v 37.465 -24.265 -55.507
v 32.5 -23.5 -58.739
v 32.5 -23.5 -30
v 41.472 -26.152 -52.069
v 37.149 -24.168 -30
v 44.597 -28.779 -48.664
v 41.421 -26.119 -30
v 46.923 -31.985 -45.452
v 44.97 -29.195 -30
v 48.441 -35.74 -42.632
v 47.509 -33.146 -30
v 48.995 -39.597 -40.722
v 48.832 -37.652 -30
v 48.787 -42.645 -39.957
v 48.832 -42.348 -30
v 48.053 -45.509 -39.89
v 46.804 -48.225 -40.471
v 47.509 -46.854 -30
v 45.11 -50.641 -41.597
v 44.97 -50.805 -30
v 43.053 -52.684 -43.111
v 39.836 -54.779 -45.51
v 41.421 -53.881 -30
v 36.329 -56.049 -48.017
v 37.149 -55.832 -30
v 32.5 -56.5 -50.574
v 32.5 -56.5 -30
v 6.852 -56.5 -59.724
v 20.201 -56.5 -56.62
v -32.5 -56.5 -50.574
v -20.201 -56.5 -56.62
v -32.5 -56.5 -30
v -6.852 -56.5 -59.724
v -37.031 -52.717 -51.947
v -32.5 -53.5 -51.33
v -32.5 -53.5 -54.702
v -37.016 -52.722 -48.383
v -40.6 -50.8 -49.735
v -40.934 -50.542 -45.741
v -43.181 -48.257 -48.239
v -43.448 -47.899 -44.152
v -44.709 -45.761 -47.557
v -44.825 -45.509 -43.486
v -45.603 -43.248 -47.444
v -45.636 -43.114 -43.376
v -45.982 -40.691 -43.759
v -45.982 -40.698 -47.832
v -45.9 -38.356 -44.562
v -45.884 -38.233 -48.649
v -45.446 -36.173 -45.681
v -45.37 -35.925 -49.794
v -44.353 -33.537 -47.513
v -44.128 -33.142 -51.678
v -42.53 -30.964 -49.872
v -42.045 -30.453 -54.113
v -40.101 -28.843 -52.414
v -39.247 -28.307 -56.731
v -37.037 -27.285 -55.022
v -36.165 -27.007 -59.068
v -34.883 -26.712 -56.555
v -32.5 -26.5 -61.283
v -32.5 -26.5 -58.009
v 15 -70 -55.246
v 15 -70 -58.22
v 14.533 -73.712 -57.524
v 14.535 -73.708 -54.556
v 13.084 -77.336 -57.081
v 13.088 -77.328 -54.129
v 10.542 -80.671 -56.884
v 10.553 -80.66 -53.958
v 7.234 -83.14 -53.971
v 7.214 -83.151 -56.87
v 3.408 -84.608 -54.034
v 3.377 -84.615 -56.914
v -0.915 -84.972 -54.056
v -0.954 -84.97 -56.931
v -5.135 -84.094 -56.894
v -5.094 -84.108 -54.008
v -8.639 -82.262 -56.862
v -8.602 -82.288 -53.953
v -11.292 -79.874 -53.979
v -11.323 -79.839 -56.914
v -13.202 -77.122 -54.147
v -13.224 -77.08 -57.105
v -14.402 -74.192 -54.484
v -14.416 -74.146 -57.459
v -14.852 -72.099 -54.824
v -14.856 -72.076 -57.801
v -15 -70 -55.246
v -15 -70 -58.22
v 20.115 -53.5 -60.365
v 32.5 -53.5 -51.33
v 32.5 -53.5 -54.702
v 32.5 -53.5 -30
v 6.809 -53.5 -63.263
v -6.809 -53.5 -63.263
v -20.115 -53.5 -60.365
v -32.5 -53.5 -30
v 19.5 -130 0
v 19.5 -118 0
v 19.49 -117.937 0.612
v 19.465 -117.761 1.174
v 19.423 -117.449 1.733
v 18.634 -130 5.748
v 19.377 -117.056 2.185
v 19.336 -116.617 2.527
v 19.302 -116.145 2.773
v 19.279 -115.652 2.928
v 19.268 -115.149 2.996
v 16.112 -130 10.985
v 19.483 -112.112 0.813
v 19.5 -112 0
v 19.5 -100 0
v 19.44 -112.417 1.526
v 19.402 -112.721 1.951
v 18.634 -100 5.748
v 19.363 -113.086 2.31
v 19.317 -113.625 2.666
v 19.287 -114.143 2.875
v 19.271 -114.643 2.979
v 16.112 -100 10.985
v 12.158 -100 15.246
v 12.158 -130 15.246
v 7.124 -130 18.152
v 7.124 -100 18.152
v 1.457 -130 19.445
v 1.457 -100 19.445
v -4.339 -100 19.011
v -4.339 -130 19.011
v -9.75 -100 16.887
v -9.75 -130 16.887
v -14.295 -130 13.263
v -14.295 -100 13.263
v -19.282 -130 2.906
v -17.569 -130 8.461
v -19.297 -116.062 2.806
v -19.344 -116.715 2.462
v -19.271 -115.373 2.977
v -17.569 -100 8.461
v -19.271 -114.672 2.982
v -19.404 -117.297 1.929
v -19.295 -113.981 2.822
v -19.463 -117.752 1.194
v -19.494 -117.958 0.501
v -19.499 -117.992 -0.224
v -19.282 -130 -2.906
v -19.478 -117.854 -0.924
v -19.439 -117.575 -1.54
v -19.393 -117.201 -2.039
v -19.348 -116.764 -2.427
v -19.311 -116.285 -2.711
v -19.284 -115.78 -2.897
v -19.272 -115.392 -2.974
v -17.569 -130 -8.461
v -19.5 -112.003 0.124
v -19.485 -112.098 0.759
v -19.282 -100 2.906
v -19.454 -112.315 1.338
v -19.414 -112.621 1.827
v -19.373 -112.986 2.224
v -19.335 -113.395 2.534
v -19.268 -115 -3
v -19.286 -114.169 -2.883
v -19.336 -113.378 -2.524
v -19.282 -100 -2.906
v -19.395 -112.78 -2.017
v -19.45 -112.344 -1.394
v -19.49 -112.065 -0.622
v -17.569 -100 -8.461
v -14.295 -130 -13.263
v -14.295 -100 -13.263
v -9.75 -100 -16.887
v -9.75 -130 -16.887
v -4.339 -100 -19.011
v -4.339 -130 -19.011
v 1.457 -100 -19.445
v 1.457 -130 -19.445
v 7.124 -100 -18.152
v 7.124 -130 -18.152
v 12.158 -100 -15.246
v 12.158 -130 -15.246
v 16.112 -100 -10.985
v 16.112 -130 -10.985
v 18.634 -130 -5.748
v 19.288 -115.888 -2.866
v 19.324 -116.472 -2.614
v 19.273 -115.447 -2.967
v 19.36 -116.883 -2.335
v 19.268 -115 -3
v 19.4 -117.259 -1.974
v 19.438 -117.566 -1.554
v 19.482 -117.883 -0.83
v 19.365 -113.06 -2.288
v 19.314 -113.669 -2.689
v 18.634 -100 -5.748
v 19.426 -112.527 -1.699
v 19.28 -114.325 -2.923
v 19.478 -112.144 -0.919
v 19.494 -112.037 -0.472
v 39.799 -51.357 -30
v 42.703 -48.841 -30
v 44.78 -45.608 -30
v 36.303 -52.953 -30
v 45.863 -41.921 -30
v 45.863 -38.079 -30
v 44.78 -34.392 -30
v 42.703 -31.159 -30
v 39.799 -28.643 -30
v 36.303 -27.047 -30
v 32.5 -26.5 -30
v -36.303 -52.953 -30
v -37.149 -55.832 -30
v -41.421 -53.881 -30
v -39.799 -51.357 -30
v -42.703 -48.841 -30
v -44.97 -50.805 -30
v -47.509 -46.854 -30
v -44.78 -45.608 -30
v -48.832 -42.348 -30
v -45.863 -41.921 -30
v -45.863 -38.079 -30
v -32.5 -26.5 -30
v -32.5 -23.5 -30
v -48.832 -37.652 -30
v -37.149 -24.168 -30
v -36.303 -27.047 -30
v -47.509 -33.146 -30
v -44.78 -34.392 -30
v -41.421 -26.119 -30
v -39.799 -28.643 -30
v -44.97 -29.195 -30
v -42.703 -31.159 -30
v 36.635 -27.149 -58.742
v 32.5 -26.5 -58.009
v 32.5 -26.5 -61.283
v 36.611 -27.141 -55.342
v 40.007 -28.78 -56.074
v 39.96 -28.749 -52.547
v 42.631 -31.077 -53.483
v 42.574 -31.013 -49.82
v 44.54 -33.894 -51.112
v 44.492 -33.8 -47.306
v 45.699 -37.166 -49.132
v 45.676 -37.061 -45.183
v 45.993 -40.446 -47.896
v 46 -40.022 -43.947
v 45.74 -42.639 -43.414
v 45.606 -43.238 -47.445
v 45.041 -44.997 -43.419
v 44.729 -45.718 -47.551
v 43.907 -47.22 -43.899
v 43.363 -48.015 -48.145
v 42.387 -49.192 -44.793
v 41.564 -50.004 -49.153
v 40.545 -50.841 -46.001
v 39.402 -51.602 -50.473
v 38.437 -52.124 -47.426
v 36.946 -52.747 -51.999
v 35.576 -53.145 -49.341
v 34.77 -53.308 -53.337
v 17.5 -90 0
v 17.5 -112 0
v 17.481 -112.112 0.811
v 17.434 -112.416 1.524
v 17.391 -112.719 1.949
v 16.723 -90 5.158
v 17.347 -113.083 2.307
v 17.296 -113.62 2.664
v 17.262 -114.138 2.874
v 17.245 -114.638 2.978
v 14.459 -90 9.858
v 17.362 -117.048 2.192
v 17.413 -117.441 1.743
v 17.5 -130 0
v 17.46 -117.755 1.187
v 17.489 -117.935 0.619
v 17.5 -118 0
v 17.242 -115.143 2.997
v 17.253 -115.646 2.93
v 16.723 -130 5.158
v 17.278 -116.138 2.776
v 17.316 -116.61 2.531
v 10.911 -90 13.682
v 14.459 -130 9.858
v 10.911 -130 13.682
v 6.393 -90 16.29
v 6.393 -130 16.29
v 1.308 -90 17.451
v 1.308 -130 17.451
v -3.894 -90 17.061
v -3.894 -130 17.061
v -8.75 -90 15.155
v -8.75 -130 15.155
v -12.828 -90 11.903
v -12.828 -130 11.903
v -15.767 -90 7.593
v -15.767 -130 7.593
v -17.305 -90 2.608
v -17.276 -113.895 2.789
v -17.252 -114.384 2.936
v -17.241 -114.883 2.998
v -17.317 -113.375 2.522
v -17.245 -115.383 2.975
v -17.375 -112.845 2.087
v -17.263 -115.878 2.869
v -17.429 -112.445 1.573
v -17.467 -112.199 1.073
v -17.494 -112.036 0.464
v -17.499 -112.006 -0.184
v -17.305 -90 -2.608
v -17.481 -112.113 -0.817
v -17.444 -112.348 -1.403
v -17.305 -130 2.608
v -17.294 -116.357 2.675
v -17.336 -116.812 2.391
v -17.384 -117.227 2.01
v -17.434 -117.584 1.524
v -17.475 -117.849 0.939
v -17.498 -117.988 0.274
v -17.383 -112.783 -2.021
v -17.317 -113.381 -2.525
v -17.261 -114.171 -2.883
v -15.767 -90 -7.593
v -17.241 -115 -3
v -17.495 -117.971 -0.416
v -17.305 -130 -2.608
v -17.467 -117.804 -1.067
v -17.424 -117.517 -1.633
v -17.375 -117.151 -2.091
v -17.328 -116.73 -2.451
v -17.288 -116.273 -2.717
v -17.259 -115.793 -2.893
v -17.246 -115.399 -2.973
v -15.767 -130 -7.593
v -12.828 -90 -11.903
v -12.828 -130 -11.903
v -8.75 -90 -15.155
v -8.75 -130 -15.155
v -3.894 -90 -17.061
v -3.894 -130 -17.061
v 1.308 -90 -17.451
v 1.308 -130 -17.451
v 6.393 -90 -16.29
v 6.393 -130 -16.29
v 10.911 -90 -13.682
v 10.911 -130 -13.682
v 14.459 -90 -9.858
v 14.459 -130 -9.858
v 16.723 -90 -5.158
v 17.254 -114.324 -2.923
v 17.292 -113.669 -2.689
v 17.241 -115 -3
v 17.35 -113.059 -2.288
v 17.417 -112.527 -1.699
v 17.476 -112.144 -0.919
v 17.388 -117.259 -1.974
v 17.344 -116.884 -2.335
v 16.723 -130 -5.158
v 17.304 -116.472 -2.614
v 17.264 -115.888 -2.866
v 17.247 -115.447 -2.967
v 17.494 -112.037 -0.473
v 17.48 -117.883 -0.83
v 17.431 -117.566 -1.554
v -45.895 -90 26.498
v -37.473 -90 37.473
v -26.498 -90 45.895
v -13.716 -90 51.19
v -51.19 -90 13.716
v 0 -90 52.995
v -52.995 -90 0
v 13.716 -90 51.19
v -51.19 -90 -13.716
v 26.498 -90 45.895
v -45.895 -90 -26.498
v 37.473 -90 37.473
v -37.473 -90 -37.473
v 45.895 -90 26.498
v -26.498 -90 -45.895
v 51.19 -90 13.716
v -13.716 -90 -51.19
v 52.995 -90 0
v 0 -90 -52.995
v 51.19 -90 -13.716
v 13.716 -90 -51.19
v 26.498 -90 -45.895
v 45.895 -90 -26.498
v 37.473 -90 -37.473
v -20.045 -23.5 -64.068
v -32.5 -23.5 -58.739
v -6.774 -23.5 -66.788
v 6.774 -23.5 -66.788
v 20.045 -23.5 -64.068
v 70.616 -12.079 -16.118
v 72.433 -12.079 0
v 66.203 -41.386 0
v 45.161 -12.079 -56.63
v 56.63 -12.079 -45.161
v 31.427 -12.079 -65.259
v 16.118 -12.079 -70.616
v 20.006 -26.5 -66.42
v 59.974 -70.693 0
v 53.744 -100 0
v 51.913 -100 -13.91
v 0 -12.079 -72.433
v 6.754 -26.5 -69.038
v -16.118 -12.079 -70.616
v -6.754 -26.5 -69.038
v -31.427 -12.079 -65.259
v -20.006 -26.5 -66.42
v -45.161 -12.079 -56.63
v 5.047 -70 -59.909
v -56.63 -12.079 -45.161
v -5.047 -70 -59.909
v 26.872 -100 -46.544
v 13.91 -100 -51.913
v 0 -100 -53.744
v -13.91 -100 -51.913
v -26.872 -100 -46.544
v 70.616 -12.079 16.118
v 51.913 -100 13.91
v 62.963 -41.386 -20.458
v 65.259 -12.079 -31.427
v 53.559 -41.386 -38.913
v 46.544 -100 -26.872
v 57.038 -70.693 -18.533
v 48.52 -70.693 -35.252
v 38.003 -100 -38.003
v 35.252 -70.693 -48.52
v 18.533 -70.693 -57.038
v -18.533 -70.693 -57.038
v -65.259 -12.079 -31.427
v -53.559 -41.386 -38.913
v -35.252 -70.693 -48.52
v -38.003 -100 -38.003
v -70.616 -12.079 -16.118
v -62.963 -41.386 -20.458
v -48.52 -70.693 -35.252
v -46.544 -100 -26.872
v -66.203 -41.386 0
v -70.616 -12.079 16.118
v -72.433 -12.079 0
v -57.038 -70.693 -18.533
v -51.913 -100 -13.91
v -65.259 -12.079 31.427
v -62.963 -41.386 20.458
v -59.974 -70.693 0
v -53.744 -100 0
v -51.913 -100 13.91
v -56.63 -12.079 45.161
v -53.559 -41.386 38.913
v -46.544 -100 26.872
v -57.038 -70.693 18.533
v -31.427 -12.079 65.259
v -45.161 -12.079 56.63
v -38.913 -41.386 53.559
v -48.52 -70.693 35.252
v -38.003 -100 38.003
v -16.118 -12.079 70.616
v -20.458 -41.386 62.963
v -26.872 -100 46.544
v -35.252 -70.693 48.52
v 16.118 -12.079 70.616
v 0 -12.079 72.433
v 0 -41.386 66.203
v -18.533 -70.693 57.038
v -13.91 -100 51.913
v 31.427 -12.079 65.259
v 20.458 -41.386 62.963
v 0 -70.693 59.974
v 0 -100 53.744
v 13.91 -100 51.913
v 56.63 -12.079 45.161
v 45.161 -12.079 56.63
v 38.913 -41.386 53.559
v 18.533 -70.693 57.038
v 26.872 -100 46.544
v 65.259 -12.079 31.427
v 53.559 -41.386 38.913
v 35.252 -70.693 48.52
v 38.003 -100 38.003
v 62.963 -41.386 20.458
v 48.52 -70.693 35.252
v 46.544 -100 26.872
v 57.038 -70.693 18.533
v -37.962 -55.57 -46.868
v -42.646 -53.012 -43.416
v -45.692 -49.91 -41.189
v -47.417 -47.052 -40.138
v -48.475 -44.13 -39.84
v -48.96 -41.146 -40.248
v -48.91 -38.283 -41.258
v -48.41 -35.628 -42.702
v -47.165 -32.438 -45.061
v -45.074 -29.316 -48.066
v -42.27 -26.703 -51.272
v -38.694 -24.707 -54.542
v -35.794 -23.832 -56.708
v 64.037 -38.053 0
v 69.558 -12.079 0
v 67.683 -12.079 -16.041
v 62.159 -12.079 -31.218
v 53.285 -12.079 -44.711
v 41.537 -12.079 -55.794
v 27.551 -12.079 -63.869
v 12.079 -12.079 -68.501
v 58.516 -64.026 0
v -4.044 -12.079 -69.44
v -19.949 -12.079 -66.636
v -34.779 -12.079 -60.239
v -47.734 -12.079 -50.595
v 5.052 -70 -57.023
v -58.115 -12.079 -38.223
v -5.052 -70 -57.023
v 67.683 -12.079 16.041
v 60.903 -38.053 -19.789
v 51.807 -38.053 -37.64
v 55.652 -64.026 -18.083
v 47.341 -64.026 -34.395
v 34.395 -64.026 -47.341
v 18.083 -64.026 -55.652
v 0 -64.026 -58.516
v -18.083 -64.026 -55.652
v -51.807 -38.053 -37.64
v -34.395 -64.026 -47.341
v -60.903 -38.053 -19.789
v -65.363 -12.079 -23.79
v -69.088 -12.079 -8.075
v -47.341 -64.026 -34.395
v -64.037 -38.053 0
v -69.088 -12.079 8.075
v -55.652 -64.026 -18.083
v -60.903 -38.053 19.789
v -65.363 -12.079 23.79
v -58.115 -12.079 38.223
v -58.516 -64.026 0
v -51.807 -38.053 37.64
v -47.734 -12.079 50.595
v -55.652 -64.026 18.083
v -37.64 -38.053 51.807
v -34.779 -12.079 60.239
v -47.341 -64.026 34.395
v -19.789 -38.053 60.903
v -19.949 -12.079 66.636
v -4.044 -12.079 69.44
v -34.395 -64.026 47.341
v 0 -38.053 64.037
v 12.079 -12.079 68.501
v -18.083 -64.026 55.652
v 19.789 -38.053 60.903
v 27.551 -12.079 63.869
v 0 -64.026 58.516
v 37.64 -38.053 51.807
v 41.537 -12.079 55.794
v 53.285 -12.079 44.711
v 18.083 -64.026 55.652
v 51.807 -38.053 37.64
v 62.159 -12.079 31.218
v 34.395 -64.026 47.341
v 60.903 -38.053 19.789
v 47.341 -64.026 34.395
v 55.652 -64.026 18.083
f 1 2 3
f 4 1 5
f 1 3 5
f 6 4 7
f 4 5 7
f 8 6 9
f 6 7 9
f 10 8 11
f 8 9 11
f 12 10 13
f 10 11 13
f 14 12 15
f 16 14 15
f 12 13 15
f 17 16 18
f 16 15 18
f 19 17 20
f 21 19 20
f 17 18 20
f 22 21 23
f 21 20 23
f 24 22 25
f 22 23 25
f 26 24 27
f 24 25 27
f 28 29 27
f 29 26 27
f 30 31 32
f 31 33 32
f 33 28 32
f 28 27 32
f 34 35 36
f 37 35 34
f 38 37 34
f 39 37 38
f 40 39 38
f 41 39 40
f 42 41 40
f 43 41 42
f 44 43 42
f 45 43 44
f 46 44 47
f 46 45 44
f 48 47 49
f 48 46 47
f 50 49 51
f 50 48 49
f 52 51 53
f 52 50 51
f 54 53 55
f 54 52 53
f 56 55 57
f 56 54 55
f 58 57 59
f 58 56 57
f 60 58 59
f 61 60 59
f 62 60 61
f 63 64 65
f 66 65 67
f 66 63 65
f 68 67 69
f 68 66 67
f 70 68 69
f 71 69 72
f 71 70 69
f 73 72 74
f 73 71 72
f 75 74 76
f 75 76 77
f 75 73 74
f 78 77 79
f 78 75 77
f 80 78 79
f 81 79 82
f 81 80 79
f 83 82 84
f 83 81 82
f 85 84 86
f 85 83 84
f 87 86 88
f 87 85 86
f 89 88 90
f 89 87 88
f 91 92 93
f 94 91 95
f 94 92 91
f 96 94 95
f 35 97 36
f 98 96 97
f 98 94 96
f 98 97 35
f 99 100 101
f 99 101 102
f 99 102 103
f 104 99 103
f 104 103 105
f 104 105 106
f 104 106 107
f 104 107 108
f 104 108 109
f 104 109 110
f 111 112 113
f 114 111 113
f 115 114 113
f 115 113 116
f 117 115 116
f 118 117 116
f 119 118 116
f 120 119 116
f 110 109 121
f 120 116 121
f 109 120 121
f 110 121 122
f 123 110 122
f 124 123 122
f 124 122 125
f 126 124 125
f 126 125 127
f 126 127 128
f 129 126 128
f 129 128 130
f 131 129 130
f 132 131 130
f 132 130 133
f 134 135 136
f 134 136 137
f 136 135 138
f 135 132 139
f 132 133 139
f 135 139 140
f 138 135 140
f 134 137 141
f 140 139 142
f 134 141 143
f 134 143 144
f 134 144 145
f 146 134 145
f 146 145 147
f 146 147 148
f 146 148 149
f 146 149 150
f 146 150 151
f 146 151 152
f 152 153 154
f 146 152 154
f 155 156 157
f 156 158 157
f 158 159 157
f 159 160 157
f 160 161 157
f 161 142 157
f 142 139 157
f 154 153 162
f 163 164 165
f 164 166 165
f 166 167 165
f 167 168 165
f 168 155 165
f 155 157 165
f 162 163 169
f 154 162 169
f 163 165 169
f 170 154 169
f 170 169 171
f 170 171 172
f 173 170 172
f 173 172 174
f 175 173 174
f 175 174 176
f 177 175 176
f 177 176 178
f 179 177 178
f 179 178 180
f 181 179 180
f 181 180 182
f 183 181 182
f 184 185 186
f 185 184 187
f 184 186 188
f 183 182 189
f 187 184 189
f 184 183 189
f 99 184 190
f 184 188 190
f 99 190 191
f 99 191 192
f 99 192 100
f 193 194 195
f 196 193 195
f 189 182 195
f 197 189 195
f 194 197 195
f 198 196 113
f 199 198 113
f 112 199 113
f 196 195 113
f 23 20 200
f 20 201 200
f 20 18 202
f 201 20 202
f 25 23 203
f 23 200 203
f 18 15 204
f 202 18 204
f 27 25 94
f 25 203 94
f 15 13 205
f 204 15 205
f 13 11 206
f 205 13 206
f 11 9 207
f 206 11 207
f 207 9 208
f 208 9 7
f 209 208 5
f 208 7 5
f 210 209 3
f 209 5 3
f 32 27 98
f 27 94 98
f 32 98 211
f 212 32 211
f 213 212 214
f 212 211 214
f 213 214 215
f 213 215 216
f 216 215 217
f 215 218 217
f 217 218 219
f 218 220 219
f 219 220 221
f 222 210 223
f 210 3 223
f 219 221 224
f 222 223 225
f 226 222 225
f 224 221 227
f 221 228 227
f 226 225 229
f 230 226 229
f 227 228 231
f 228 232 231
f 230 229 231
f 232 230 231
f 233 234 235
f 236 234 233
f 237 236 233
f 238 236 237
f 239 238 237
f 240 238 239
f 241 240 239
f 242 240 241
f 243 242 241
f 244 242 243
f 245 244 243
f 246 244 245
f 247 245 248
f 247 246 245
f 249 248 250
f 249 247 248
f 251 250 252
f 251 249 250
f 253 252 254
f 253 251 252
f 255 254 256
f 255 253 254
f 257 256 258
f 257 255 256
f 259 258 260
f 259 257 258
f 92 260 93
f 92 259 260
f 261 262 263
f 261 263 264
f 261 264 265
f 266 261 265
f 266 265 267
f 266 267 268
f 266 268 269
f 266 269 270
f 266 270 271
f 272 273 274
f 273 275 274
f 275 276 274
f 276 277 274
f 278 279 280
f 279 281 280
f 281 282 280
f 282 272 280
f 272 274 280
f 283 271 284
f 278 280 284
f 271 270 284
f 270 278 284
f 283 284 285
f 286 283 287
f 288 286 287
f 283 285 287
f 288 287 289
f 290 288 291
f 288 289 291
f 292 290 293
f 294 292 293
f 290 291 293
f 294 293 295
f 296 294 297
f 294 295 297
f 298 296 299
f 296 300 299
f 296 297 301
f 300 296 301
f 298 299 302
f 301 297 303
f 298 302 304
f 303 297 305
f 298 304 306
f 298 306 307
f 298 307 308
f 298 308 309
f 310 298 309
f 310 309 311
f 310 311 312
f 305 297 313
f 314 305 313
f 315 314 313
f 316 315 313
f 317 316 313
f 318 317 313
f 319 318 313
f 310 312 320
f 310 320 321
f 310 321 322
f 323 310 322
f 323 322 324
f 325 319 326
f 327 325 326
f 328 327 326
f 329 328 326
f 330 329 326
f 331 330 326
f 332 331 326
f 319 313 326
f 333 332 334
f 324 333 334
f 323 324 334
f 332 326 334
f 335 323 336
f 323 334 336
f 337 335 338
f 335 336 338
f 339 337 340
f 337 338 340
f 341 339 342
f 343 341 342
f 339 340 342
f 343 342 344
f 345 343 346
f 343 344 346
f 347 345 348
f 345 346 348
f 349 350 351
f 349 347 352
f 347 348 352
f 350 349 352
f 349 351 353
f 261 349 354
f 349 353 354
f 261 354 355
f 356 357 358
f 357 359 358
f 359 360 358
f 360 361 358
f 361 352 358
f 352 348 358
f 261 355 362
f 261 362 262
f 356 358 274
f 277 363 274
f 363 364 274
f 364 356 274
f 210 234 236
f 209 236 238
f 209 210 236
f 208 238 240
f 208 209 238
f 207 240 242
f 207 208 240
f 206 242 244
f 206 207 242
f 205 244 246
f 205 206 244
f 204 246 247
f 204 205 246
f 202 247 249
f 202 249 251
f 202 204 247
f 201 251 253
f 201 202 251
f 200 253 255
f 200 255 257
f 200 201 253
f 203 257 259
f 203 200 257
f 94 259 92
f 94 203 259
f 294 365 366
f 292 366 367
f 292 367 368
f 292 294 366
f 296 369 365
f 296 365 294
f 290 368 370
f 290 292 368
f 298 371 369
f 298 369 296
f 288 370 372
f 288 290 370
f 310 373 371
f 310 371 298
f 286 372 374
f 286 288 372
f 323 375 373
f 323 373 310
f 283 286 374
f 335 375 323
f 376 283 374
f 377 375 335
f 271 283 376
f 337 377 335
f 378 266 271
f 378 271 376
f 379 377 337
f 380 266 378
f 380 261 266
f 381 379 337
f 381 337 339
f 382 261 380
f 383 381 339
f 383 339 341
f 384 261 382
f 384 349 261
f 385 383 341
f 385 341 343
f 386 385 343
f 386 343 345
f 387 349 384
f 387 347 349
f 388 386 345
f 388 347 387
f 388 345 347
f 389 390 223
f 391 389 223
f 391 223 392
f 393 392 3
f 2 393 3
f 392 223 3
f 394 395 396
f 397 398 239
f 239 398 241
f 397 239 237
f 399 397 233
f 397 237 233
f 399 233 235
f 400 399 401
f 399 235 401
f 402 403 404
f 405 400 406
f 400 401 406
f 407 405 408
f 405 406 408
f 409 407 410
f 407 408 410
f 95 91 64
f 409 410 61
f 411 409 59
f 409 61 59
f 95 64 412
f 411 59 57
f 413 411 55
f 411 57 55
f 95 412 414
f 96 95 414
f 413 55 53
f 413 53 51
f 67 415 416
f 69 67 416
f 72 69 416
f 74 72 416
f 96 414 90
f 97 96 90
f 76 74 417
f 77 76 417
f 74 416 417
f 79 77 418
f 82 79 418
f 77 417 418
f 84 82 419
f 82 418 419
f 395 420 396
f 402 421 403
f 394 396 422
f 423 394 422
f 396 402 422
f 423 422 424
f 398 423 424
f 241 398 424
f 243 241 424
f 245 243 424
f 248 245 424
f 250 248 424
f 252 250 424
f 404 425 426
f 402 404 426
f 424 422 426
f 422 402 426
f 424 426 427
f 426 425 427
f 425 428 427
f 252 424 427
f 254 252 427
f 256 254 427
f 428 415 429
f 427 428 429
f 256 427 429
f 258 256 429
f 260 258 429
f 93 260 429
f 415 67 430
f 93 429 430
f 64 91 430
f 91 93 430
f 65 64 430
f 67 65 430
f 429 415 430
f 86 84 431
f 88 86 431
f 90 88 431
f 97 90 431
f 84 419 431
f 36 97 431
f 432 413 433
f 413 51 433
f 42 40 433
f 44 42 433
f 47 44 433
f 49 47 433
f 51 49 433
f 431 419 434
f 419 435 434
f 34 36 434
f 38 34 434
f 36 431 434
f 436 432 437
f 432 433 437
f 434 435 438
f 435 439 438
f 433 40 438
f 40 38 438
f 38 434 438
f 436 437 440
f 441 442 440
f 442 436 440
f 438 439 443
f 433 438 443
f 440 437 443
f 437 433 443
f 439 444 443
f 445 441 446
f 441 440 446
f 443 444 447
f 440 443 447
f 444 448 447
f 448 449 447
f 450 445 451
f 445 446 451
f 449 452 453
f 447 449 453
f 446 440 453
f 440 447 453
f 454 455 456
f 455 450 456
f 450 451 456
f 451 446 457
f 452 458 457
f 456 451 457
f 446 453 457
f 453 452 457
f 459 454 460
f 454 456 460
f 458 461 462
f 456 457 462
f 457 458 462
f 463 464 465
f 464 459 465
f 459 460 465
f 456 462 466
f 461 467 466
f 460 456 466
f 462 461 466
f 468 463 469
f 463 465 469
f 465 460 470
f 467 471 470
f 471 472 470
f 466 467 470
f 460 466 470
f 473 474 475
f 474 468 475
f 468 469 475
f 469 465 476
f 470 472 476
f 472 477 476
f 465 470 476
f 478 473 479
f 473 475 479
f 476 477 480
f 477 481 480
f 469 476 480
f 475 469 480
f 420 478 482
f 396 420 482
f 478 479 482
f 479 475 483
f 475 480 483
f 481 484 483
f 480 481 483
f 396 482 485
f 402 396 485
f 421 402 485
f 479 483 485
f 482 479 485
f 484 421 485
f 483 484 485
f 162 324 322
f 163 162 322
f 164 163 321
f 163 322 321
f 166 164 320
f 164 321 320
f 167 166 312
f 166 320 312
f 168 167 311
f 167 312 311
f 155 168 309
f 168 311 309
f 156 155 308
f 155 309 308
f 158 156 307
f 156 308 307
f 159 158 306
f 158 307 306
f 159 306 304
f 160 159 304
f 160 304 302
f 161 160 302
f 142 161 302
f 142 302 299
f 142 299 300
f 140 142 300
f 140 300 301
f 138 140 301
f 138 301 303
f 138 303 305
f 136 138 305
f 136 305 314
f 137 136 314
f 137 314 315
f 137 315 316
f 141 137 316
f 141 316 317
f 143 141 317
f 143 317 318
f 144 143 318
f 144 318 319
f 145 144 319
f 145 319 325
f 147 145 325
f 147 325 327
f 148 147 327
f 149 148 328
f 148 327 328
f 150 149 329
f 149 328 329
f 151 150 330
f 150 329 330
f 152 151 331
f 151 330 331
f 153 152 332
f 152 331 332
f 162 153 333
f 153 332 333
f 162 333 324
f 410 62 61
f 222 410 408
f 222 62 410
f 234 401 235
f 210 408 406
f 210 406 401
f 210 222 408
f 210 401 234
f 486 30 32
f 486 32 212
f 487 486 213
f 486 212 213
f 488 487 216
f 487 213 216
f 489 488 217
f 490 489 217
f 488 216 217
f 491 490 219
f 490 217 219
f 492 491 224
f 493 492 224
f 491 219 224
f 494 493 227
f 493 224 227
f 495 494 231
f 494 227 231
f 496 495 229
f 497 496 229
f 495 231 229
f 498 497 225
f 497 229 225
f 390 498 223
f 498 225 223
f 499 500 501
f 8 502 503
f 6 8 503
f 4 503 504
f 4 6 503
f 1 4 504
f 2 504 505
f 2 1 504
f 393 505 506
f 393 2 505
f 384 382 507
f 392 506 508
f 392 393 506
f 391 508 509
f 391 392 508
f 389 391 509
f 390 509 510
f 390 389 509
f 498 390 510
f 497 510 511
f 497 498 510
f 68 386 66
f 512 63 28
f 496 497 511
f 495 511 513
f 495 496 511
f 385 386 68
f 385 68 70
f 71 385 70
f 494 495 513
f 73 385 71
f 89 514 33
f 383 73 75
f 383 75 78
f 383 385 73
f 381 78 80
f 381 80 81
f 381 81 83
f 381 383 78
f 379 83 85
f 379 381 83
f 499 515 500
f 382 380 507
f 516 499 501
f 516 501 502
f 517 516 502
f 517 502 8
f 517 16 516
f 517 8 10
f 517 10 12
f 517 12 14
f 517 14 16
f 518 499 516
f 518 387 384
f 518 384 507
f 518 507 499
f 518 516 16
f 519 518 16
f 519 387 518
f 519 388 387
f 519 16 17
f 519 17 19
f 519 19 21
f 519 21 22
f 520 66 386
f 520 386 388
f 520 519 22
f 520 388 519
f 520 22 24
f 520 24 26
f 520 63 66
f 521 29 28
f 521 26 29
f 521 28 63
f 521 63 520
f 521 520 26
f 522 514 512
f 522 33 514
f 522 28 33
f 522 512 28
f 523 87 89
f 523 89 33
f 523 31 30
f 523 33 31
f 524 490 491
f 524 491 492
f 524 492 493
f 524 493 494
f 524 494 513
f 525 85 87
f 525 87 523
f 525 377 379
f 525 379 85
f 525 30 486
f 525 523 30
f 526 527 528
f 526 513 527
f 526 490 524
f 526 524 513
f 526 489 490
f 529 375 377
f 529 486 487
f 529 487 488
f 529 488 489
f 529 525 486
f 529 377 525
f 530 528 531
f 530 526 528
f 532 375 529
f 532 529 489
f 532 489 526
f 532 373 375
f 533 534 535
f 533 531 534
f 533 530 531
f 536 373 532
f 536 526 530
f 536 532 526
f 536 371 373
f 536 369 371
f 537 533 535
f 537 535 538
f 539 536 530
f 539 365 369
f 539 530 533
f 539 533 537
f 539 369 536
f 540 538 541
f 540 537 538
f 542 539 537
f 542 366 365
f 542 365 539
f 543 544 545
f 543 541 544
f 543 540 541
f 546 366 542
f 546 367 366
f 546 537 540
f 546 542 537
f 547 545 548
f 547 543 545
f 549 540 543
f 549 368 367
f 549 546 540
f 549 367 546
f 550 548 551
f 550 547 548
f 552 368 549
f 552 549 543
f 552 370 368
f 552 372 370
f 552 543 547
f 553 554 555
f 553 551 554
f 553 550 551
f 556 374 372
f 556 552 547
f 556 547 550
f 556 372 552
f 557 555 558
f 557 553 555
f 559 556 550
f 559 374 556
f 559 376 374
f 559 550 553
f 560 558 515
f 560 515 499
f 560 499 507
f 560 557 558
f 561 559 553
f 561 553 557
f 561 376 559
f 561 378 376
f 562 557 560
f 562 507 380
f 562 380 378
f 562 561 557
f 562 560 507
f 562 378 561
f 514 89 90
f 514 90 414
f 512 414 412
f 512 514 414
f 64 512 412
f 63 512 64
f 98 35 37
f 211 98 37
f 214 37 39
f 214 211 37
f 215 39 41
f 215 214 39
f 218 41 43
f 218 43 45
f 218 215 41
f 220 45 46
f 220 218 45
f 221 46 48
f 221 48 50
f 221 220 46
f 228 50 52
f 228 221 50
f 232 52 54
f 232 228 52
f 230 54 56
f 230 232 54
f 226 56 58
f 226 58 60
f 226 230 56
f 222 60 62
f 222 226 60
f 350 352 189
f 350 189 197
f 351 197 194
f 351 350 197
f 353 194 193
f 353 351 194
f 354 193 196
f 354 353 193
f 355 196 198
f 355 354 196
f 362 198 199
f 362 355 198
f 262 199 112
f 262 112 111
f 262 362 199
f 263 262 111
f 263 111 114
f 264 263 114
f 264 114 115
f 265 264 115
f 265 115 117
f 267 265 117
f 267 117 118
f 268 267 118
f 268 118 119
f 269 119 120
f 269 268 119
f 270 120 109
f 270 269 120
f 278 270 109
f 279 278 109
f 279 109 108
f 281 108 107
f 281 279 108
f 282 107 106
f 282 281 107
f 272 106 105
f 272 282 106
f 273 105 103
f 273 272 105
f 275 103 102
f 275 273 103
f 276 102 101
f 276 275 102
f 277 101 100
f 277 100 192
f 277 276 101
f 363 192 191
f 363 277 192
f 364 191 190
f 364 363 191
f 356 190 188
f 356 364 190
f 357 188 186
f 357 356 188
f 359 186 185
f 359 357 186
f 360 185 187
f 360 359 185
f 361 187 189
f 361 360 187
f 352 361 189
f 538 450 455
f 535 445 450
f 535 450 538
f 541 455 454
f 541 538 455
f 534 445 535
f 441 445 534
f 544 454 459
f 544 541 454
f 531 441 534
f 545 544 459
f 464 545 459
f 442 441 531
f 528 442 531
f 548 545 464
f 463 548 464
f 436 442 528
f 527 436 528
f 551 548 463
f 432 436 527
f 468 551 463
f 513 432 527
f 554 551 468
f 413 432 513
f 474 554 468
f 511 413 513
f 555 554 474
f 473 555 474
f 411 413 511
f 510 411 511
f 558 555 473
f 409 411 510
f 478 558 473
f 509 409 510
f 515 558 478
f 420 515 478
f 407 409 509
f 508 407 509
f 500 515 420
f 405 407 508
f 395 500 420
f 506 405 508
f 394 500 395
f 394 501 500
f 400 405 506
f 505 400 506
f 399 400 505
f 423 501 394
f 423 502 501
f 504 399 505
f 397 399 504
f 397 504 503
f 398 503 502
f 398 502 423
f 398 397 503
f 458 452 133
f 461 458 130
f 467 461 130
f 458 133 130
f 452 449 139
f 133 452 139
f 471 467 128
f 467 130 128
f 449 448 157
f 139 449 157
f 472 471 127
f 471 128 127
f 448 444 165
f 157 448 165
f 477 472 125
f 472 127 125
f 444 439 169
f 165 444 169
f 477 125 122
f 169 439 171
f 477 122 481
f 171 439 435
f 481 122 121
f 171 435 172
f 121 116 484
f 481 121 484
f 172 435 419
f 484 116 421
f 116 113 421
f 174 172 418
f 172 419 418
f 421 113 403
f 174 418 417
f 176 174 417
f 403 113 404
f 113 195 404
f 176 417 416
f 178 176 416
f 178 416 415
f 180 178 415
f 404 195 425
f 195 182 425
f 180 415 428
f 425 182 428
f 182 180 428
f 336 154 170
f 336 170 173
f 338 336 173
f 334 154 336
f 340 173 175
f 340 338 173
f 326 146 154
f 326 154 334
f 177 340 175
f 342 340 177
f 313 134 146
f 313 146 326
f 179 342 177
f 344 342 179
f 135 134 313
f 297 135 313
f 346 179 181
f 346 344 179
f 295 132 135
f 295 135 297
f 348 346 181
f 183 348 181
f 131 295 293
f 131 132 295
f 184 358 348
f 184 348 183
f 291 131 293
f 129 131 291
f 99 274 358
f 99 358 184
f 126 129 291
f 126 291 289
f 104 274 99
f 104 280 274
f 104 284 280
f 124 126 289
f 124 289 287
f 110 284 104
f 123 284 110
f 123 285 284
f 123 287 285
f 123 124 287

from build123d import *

# Parameters (mm, degrees)
SKETCH1_R               = 75
BOSS_EXTRUDE1_DEPTH     = 100
BOSS_EXTRUDE1_TAPER     = 12
SKETCH3_R               = 70
CUT_EXTRUDE1_DEPTH      = 80
CUT_EXTRUDE1_TAPER      = 12
FILLET1_R               = 10
CUT_EXTRUDE2_DEPTH      = 90
SKETCH5_R               = 19.5
SKETCH5_R_2             = 17.5
BOSS_EXTRUDE2_DEPTH     = 30
SKETCH6_R               = 17.5
CUT_EXTRUDE3_DEPTH      = 30
BOSS_EXTRUDE7_REACH     = 44.651
SKETCH17_R              = 73.5
CUT_EXTRUDE4_DEPTH      = 25
SKETCH18_R              = 3
CUT_EXTRUDE5_DEPTH      = 73.432504542
CUT_EXTRUDE5_DEPTH_BACK = 73.432504542


with BuildPart() as part:
    # Sketch1 → Boss-Extrude1 (new body)
    with BuildSketch(Plane(origin=(0, 0, 0), x_dir=(1, 0, 0), z_dir=(0, 1, 0))):
        Circle(SKETCH1_R)
    extrude(amount=-BOSS_EXTRUDE1_DEPTH, taper=BOSS_EXTRUDE1_TAPER)

    # Sketch3 → Cut-Extrude1 (cut)
    with BuildSketch(Plane(origin=(0, -10, 0), x_dir=(1, 0, 0), z_dir=(0, 1, 0))):
        Circle(SKETCH3_R)
    extrude(amount=-CUT_EXTRUDE1_DEPTH, taper=CUT_EXTRUDE1_TAPER, mode=Mode.SUBTRACT)

    # Fillet1
    fillet1_edges = [part.edges().sort_by_distance(p)[0] for p in [
        (-75, 0, 0),
    ]]
    fillet(fillet1_edges, radius=FILLET1_R)

    # Sketch4 → Cut-Extrude2 (cut)
    with BuildSketch(Plane.XY):
        with BuildLine():
            Line((-15, -70), (15, -70))
            ThreePointArc((15, -70), (0, -85), (-15, -70))
        make_face()
        with BuildLine():
            Line((-32.5, -26.5), (32.5, -26.5))
            ThreePointArc((32.5, -26.5), (46, -40), (32.5, -53.5))
            Line((32.5, -53.5), (-32.5, -53.5))
            ThreePointArc((-32.5, -53.5), (-46, -40), (-32.5, -26.5))
        make_face()
    extrude(amount=-CUT_EXTRUDE2_DEPTH, mode=Mode.SUBTRACT)

    # Sketch5 → Boss-Extrude2 (add)
    with BuildSketch(Plane.XZ.offset(100)):
        Circle(SKETCH5_R)
        Circle(SKETCH5_R_2, mode=Mode.SUBTRACT)
    extrude(amount=BOSS_EXTRUDE2_DEPTH)

    # Sketch6 → Cut-Extrude3 (cut)
    with BuildSketch(Plane.XZ.offset(100)):
        Circle(SKETCH6_R)
    extrude(amount=-CUT_EXTRUDE3_DEPTH, mode=Mode.SUBTRACT)

    # Sketch16 → Boss-Extrude7 (add, up to next)
    with BuildSketch(Plane.XY.offset(-30), mode=Mode.PRIVATE) as boss_extrude7_sk1:
        with BuildLine():
            Line((32.5, -56.5), (-32.5, -56.5))
            ThreePointArc((-32.5, -56.5), (-49, -40), (-32.5, -23.5))
            Line((-32.5, -23.5), (32.5, -23.5))
            ThreePointArc((32.5, -23.5), (49, -40), (32.5, -56.5))
        make_face()
        with BuildLine():
            Line((32.5, -53.5), (-32.5, -53.5))
            ThreePointArc((-32.5, -53.5), (-46, -40), (-32.5, -26.5))
            Line((-32.5, -26.5), (32.5, -26.5))
            ThreePointArc((32.5, -26.5), (46, -40), (32.5, -53.5))
        make_face(mode=Mode.SUBTRACT)
    boss_extrude7_tool1 = extrude(boss_extrude7_sk1.sketch, amount=-BOSS_EXTRUDE7_REACH, mode=Mode.PRIVATE) - part.part
    add(boss_extrude7_tool1.solids().sort_by_distance((0, -55.46593, -30))[0])

    # Sketch17 → Cut-Extrude4 (cut)
    with BuildSketch(Plane(origin=(0, -12.079116908, 0), x_dir=(1, 0, 0), z_dir=(0, 1, 0))):
        Circle(SKETCH17_R)
    extrude(amount=CUT_EXTRUDE4_DEPTH, mode=Mode.SUBTRACT)

    # Sketch18 → Cut-Extrude5 (cut, two sides)
    with BuildSketch(Plane(origin=(0, 0, 0), x_dir=(0, 0, -1), z_dir=(1, 0, 0))) as cut_extrude5_sk:
        with Locations((0, -115)):
            Circle(SKETCH18_R)
    extrude(amount=CUT_EXTRUDE5_DEPTH, mode=Mode.SUBTRACT)
    extrude(cut_extrude5_sk.sketch, amount=-CUT_EXTRUDE5_DEPTH_BACK, mode=Mode.SUBTRACT)


solid = part.part
